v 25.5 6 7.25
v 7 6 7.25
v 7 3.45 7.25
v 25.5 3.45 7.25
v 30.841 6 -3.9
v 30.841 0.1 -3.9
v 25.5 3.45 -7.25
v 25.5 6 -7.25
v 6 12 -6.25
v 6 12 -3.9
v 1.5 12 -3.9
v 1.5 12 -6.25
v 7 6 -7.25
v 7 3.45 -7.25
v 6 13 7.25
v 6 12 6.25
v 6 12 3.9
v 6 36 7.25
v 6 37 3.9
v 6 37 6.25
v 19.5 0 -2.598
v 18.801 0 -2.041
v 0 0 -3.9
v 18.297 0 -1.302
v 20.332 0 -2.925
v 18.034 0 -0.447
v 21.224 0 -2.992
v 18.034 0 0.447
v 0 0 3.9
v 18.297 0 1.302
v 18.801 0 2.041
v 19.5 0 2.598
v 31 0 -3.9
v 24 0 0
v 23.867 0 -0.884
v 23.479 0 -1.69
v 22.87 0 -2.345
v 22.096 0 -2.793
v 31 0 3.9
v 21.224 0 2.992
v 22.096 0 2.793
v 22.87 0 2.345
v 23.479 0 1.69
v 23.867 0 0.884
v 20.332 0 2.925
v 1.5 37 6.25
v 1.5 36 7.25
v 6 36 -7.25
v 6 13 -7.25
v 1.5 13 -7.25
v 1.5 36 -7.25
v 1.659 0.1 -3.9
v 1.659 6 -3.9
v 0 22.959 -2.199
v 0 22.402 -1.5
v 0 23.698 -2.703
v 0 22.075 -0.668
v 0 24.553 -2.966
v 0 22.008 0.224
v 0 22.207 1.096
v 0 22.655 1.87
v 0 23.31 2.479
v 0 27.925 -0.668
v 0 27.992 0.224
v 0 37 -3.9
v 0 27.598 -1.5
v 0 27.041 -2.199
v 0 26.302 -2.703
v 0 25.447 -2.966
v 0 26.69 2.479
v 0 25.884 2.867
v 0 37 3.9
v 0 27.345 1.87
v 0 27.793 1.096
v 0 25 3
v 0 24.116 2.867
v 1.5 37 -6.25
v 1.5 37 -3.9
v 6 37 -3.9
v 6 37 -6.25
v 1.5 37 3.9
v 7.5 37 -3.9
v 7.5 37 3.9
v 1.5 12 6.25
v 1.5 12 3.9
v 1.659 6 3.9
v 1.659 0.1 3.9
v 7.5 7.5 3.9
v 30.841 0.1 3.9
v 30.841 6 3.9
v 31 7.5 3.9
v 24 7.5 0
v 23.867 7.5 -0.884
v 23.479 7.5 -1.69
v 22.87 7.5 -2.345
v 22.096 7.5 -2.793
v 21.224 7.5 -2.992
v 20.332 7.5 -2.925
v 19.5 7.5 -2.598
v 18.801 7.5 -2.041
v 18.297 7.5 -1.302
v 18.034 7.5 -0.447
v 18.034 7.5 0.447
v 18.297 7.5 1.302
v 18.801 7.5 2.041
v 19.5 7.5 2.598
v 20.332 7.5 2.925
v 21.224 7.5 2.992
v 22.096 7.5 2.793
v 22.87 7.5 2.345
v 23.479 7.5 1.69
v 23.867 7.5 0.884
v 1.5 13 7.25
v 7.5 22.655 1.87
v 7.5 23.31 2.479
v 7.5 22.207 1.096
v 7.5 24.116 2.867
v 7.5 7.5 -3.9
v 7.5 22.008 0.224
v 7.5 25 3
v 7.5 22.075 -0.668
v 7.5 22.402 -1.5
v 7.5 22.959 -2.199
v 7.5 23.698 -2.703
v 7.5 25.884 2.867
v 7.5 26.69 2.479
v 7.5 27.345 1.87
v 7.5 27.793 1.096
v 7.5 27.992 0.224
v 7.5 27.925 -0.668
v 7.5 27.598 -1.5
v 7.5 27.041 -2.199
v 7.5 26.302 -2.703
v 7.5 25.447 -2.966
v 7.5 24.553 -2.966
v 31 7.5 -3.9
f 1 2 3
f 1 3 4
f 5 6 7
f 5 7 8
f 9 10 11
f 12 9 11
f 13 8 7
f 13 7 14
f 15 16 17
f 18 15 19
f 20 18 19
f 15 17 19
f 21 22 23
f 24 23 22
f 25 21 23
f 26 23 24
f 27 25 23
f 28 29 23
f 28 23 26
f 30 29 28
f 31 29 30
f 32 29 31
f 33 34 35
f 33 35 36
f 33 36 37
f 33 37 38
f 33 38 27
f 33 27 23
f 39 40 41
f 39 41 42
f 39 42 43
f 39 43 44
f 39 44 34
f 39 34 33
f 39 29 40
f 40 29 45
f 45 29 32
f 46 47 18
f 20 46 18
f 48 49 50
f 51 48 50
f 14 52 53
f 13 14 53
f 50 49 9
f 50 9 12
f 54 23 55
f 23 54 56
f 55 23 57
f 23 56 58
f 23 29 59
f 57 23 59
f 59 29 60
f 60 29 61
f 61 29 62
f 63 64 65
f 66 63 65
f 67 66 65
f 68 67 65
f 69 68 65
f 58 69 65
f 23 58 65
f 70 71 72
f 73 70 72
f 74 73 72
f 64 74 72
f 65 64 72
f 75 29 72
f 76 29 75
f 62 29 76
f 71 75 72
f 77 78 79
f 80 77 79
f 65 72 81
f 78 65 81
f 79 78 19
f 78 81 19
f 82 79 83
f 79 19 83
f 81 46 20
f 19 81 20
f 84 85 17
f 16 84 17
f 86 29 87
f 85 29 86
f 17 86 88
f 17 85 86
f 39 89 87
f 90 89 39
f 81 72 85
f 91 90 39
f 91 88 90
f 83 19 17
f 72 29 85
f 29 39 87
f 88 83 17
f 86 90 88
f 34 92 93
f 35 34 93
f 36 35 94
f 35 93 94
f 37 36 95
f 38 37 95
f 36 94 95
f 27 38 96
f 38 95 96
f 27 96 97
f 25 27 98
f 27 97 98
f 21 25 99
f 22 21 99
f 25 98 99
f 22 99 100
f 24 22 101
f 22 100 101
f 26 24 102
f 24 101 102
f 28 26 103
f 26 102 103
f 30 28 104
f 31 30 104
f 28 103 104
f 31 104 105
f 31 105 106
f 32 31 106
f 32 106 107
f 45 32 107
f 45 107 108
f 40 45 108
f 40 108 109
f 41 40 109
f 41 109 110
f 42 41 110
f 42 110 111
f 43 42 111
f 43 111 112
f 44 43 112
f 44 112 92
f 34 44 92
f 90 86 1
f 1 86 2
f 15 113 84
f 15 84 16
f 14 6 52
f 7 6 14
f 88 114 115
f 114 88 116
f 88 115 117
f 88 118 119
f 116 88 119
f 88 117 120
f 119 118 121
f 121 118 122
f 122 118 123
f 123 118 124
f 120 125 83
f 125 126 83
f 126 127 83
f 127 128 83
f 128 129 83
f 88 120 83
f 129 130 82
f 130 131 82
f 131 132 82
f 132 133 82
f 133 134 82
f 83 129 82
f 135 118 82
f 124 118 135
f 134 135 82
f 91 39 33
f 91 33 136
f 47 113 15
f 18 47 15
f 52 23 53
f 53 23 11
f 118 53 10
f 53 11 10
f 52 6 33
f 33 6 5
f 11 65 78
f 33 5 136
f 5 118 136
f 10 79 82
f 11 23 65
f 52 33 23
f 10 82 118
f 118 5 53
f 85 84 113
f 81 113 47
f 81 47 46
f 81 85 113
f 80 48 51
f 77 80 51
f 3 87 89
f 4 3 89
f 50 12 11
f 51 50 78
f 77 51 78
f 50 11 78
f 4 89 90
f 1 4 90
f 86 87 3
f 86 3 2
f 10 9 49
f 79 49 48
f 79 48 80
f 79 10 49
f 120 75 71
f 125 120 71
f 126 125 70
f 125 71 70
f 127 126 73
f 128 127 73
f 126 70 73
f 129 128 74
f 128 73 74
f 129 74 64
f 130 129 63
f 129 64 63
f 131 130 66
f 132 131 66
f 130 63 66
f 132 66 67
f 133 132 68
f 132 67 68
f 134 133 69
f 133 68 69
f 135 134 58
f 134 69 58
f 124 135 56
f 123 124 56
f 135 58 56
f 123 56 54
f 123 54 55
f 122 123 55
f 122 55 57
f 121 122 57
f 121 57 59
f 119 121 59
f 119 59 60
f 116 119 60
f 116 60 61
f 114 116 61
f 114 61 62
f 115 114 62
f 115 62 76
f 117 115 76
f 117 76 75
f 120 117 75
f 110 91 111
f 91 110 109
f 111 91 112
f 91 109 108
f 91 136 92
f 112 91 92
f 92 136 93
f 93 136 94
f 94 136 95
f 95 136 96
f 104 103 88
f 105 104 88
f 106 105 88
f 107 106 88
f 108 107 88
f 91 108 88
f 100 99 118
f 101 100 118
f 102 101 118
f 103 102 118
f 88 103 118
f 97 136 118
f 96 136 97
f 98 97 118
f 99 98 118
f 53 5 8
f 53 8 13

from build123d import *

# Parameters (mm, degrees)
SKETCH_1_W                = 31
SKETCH_1_H                = 37
EXTRUDE_1_DEPTH           = 7.8
SKETCH_2_W                = 23.5
SKETCH_2_H                = 29.5
CUT_EXTRUDE_1_DEPTH       = 49.896216623
SKETCH_3_W                = 29.18115942
SKETCH_3_H                = 5.9
EXTRUDE_2_DEPTH           = 3.35
SKETCH_4_W                = 4.5
SKETCH_4_H                = 25
EXTRUDE_3_DEPTH           = 3.35
SKETCH_5_W                = 4.5
SKETCH_5_H                = 25
EXTRUDE_4_DEPTH           = 3.35
SKETCH_6_W                = 29.18115942
SKETCH_6_H                = 5.9
EXTRUDE_5_DEPTH           = 3.35
DRAFT_1_ANGLE             = 45
DRAFT_2_ANGLE             = 45
DRAFT_3_ANGLE             = 57.901072745
DRAFT_4_ANGLE             = 57.901072745
HOLE_WIZARD_6_0_6_1_D     = 6
HOLE_WIZARD_6_0_6_2_D     = 6
HOLE_WIZARD_6_0_6_2_DEPTH = 37
CHAMFER_1_SIZE            = 1


with BuildPart() as part:
    # 草图1 → 凸台-拉伸1 (new body)
    with BuildSketch(Plane.XY.offset(3.9)):
        with Locations((15.5, 18.5)):
            Rectangle(SKETCH_1_W, SKETCH_1_H)
    extrude(amount=-EXTRUDE_1_DEPTH)

    # 草图2 → 切除-拉伸1 (cut, through all)
    with BuildSketch(Plane(origin=(0, 0, -3.9), x_dir=(-1, 0, 0), z_dir=(0, 0, -1))):
        with Locations((-19.25, 22.25)):
            Rectangle(SKETCH_2_W, SKETCH_2_H)
    extrude(amount=-CUT_EXTRUDE_1_DEPTH, mode=Mode.SUBTRACT)

    # 草图3 → 凸台-拉伸2 (add)
    with BuildSketch(Plane.XY.offset(3.9)):
        with Locations((16.25, 3.05)):
            Rectangle(SKETCH_3_W, SKETCH_3_H)
    extrude(amount=EXTRUDE_2_DEPTH)

    # 草图4 → 凸台-拉伸3 (add)
    with BuildSketch(Plane.XY.offset(3.9)):
        with Locations((3.75, 24.5)):
            Rectangle(SKETCH_4_W, SKETCH_4_H)
    extrude(amount=EXTRUDE_3_DEPTH)

    # 草图5 → 凸台-拉伸4 (add)
    with BuildSketch(Plane(origin=(0, 0, -3.9), x_dir=(-1, 0, 0), z_dir=(0, 0, -1))):
        with Locations((-3.75, 24.5)):
            Rectangle(SKETCH_5_W, SKETCH_5_H)
    extrude(amount=EXTRUDE_4_DEPTH)

    # 草图6 → 凸台-拉伸5 (add)
    with BuildSketch(Plane(origin=(0, 0, -3.9), x_dir=(-1, 0, 0), z_dir=(0, 0, -1))):
        with Locations((-16.25, 3.05)):
            Rectangle(SKETCH_6_W, SKETCH_6_H)
    extrude(amount=EXTRUDE_5_DEPTH)

    # 拔模1
    draft_1_faces = [part.faces().sort_by_distance(p)[0] for p in [
        (16.25, 0.1, -5.575),
    ]]
    draft(draft_1_faces, Plane(origin=(0, 0, -3.9), x_dir=(-1, 0, 0), z_dir=(0, 0, -1)), DRAFT_1_ANGLE)

    # 拔模2
    draft_2_faces = [part.faces().sort_by_distance(p)[0] for p in [
        (16.25, 0.1, 5.575),
    ]]
    draft(draft_2_faces, Plane.XY.offset(3.9), DRAFT_2_ANGLE)

    # 拔模3
    draft_3_faces = [part.faces().sort_by_distance(p)[0] for p in [
        (30.84057971, 3.776824458, -5.353648915),
        (1.65942029, 3.776824458, -5.353648915),
    ]]
    draft(draft_3_faces, Plane(origin=(0, 0, -3.9), x_dir=(-1, 0, 0), z_dir=(0, 0, -1)), DRAFT_3_ANGLE)

    # 拔模4
    draft_4_faces = [part.faces().sort_by_distance(p)[0] for p in [
        (30.84057971, 3.776824458, 5.353648915),
        (1.65942029, 3.776824458, 5.353648915),
    ]]
    draft(draft_4_faces, Plane.XY.offset(3.9), DRAFT_4_ANGLE)

    # Ø6.0 (6) 直径孔1 (through all)
    with Locations(Plane(origin=(7.5, 0, 0), x_dir=(0, 0, -1), z_dir=(1, 0, 0))):
        with Locations((0, 25)):
            Hole(HOLE_WIZARD_6_0_6_1_D / 2)

    # Ø6.0 (6) 直径孔2
    with Locations(Plane(origin=(0, 0, 0), x_dir=(-1, 0, 0), z_dir=(0, -1, 0))):
        with Locations((-21, 0)):
            Hole(HOLE_WIZARD_6_0_6_2_D / 2, depth=HOLE_WIZARD_6_0_6_2_DEPTH)

    # 倒角1
    chamfer_1_edges = [part.edges().sort_by_distance(p)[0] for p in [
        (3.75, 12, 7.25),
        (3.75, 37, 7.25),
        (3.75, 12, -7.25),
        (3.75, 37, -7.25),
    ]]
    chamfer(chamfer_1_edges, length=CHAMFER_1_SIZE)


solid = part.part
